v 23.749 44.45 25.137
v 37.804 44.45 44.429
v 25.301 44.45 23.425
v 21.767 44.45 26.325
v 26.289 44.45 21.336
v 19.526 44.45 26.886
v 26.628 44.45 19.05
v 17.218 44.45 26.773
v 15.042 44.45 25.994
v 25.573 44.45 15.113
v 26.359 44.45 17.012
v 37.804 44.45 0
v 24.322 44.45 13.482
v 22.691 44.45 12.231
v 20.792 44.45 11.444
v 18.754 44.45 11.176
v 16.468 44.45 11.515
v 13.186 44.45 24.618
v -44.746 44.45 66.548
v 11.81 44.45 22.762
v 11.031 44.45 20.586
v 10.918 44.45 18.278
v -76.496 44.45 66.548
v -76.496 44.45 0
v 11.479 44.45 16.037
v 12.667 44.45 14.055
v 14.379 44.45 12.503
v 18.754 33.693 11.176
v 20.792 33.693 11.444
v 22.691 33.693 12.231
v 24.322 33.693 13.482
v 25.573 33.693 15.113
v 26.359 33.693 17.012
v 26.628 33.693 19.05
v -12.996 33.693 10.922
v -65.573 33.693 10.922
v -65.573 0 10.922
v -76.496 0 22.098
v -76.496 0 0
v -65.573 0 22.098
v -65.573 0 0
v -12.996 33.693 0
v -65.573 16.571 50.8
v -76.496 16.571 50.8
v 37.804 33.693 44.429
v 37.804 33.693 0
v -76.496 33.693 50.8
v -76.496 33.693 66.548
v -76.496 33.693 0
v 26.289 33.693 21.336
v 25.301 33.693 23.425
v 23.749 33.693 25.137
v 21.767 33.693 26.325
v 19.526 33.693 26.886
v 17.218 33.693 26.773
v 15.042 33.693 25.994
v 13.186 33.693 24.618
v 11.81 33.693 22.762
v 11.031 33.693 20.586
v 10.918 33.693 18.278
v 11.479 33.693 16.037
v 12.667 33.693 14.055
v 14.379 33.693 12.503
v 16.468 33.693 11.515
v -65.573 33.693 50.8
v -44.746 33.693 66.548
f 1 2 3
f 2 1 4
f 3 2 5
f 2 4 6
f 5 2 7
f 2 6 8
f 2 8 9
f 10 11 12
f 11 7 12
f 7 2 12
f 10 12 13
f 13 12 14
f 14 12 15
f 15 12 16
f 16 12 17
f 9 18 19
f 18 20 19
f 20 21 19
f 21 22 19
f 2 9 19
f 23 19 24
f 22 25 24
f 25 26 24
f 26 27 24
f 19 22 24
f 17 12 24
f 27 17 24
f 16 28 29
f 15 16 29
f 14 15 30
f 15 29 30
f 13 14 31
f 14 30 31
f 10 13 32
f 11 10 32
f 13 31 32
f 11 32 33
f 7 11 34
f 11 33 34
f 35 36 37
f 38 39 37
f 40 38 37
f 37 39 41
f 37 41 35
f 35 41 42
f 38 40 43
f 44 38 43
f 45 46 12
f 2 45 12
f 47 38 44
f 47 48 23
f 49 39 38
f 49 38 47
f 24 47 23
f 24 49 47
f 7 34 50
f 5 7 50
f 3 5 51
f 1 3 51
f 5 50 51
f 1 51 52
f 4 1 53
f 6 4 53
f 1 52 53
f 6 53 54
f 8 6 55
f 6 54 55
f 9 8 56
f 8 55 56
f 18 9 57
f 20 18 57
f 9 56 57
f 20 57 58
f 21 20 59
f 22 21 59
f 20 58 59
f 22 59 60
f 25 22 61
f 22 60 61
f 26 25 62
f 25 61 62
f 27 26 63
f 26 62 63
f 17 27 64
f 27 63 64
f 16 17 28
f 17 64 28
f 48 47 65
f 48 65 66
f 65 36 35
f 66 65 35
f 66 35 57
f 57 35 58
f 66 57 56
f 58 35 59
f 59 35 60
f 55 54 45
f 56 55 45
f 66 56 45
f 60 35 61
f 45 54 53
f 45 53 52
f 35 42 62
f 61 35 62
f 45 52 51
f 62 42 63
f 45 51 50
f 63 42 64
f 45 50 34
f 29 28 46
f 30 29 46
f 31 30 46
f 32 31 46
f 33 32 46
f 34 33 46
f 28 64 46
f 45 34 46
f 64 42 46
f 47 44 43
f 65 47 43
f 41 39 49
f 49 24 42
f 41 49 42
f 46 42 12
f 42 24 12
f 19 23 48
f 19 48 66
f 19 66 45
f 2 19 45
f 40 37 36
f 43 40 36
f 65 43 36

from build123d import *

# Parameters (mm, degrees)
F1_DEPTH = 66.548
F0_W     = 10.9235864809
F0_H     = 33.6925396672
F2_DEPTH = 10.922
F4_DEPTH = 10.7584603328
F5_DEPTH = 50.8
F7_DEPTH = 127
F8_DEPTH = 127


with BuildPart() as f1:
    # F0 (on Top) → F1 (new body)
    with BuildSketch(Plane.XY):
        Polygon((37.8037942689, 44.45), (-76.4962057311, 44.45), (-76.4962057311, 33.6925396672), (-65.5726192503, 33.6925396672), (-12.9962057311, 33.6925396672), (37.8037942689, 33.6925396672), align=None)
    extrude(amount=F1_DEPTH)

    # F0 (on Top) → F2 (join)
    with BuildSketch(Plane.XY):
        with Locations((-71.0344124907, 16.8462698336)):
            Rectangle(F0_W, F0_H)
        Polygon((-12.9962057311, 33.6925396672), (-65.5726192503, 33.6925396672), (-65.5726192503, 0), align=None)
    extrude(amount=F2_DEPTH)

    # F3 (on face) → F4 (cut, through all)
    with BuildSketch(Plane.XZ.offset(-33.6925396672)):
        with BuildLine():
            ThreePointArc((26.6277942689, 19.05), (13.1860354738, 24.6177587951), (18.7537942689, 11.176))
            ThreePointArc((18.7537942689, 11.176), (24.3215530639, 13.4822412049), (26.6277942689, 19.05))
        make_face()
    extrude(amount=-F4_DEPTH, mode=Mode.SUBTRACT)

    # F0 (on Top) → F5 (join)
    with BuildSketch(Plane.XY):
        with Locations((-71.0344124907, 16.8462698336)):
            Rectangle(F0_W, F0_H)
    extrude(amount=F5_DEPTH)

    # F6 (on face) → F7 (cut)
    with BuildSketch(Plane.YZ.offset(-65.5726192503)):
        Polygon((0, 50.8), (0, 22.098), (16.5711074263, 50.8), align=None)
    extrude(amount=-F7_DEPTH, mode=Mode.SUBTRACT)

    # F3 (on face) → F8 (cut)
    with BuildSketch(Plane.XZ.offset(-33.6925396672)):
        Polygon((-44.7462057311, 66.548), (37.8037942689, 44.4287941648), (37.8037942689, 66.548), align=None)
    extrude(amount=-F8_DEPTH, mode=Mode.SUBTRACT)


solid = f1.part
